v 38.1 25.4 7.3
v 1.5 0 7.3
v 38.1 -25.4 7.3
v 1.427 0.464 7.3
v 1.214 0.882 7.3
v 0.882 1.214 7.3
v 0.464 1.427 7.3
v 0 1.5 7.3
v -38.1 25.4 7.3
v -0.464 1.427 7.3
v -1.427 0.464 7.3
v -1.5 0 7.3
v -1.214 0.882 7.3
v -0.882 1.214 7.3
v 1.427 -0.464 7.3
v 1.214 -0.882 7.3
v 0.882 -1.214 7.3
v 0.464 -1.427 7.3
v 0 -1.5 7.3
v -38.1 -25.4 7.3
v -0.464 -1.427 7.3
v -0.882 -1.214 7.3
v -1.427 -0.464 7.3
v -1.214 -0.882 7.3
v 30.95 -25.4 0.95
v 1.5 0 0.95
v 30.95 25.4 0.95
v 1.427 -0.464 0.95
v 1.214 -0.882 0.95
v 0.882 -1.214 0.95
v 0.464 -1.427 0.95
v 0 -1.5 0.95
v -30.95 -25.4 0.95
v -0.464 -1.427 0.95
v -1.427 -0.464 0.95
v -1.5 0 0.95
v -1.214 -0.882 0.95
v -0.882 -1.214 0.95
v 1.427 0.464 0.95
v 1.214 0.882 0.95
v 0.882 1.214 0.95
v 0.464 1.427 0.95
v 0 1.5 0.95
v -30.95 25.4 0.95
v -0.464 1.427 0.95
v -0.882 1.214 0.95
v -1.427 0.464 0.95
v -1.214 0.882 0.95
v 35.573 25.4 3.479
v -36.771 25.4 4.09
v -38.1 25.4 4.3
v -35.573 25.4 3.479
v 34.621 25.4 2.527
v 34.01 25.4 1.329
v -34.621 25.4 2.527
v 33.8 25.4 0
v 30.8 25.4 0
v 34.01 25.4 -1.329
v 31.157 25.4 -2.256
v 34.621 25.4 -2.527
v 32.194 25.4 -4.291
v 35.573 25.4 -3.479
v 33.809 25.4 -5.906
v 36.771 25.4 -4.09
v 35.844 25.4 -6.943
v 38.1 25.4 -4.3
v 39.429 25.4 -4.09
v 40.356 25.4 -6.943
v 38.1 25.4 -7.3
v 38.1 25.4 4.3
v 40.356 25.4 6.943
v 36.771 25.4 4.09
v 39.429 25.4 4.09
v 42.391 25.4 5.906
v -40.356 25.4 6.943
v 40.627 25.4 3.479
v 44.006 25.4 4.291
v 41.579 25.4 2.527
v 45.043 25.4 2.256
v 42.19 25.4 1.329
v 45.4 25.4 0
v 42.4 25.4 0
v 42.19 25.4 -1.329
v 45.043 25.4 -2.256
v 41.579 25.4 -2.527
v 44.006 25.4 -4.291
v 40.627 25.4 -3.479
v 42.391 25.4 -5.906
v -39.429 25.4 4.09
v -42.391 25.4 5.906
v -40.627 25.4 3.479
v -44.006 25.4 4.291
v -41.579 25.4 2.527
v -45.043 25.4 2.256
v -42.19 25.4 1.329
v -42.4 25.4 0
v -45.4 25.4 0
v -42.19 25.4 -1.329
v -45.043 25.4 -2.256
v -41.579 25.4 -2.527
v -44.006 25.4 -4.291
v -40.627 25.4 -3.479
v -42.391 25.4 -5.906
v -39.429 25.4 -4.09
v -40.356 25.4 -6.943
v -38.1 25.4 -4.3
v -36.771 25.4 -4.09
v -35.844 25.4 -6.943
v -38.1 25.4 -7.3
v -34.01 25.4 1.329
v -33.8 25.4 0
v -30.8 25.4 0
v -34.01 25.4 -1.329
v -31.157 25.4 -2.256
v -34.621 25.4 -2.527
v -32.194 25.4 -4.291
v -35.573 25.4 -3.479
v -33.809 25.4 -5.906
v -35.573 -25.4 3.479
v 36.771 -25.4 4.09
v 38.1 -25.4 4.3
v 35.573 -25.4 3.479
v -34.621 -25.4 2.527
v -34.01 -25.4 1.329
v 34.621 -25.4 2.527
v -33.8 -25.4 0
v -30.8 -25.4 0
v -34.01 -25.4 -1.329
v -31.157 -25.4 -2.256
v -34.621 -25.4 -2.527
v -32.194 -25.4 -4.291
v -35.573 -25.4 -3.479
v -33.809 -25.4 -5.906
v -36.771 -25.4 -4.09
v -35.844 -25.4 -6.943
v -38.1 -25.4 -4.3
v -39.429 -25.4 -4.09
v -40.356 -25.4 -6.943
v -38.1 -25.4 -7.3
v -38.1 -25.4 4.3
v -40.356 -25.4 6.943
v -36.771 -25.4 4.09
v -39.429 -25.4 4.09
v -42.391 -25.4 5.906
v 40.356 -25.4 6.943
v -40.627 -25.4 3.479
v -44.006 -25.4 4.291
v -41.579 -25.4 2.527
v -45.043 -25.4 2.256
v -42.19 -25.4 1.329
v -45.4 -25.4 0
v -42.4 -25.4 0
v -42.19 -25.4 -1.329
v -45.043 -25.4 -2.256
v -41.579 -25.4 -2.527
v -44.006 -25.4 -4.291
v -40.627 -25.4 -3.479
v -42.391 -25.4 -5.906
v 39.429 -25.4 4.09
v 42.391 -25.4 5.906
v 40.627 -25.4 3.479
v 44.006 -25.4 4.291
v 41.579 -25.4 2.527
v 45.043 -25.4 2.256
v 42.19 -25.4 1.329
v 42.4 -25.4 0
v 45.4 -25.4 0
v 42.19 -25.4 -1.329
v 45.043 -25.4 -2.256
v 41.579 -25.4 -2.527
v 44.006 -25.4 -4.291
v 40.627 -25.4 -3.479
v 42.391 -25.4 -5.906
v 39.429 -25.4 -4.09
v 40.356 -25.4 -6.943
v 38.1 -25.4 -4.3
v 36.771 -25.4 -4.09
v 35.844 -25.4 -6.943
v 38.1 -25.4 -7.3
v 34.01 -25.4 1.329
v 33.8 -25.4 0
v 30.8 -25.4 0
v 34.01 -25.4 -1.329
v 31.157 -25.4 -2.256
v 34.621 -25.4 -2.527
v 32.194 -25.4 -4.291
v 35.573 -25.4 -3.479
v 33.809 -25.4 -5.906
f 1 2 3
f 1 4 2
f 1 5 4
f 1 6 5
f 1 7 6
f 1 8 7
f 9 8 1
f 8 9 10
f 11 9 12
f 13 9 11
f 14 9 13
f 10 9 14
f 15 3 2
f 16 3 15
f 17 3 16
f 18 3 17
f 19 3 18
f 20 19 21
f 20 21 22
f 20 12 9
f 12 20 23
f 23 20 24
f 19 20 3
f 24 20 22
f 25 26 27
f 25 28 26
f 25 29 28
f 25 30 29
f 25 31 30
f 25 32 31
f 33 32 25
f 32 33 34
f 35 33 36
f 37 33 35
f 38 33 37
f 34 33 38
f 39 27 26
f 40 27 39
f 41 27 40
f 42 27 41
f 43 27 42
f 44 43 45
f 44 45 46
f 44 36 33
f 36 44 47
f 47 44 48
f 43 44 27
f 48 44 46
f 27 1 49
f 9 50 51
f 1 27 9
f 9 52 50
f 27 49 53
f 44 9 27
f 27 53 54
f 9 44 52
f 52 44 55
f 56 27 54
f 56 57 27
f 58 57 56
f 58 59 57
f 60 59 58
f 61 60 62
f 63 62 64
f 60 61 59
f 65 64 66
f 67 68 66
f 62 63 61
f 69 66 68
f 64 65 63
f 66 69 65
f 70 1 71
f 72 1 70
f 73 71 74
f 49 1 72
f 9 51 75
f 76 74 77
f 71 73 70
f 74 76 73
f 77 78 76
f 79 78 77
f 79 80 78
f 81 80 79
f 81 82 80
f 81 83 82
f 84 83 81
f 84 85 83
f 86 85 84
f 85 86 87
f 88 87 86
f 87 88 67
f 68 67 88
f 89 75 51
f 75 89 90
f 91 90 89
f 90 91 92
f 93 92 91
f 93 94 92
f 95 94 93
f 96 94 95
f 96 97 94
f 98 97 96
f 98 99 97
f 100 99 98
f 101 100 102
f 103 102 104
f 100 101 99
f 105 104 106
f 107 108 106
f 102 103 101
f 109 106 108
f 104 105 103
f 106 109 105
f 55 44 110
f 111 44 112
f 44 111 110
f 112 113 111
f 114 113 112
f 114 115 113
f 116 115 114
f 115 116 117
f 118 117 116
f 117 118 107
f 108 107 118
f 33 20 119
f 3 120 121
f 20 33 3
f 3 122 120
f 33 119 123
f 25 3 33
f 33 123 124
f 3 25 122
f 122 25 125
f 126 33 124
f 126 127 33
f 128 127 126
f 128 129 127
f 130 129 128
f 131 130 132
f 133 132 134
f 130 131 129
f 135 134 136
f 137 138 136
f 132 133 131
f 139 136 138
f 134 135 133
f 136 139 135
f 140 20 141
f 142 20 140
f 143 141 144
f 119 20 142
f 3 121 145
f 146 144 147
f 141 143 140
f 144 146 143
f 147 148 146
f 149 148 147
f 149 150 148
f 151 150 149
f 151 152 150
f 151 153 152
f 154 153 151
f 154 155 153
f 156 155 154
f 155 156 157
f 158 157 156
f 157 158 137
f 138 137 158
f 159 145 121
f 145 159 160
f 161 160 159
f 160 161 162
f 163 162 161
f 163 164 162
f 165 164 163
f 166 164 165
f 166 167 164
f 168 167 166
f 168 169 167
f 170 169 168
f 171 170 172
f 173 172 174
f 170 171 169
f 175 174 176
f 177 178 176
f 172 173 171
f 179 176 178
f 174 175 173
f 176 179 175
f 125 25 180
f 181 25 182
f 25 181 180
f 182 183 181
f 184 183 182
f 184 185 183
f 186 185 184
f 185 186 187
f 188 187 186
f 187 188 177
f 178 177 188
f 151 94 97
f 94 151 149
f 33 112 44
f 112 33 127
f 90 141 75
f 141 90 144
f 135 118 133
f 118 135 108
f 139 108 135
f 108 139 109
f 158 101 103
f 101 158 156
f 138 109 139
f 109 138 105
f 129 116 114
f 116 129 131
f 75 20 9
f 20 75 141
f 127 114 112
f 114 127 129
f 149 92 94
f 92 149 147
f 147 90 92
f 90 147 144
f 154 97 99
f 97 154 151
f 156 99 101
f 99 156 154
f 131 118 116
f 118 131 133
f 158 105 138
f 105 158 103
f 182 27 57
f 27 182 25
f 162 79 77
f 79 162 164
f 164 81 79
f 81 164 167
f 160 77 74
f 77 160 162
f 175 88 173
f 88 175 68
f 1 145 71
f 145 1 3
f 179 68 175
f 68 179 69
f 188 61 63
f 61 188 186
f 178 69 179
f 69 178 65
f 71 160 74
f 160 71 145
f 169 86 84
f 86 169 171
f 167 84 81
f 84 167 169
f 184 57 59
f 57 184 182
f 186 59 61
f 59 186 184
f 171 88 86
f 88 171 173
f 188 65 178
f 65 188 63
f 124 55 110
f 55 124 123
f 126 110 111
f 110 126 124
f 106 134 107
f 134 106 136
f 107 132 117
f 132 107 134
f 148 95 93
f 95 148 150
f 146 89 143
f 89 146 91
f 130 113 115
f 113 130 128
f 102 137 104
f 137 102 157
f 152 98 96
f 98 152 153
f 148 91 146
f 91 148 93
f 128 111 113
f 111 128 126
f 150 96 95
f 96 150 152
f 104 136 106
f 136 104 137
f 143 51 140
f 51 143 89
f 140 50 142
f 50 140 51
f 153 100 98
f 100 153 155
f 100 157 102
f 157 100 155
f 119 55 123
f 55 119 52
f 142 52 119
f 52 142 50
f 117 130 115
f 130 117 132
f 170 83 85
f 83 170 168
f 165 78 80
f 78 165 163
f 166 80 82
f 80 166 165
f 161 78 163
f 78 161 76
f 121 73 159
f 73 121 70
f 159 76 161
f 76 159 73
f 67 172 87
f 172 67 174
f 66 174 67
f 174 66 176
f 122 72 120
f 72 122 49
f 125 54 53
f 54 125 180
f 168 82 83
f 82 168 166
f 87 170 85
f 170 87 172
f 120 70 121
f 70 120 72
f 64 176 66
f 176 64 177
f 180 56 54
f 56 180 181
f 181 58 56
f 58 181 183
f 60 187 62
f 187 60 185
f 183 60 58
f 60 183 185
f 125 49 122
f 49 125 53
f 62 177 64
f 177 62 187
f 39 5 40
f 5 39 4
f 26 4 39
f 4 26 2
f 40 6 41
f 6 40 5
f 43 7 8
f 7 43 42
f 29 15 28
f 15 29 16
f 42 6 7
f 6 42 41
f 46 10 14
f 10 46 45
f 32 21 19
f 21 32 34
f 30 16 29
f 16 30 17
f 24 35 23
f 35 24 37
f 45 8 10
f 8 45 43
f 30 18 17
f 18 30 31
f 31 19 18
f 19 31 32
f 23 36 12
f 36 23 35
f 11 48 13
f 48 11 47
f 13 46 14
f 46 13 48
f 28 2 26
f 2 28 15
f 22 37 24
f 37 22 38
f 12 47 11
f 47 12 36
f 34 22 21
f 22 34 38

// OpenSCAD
include <MCAD/units.scad>

// Platform parameters
platform_width = 2*inch;
platform_thickness = .25*inch;

// Threaded rod parameters
rod_diameter = M8 + 0.6;
rod_distance = 3*inch;
rod_margin = 3;

// Center screw hole
screw_size = M3;

generatePlatform();

module generatePlatform() {
	difference() {
		union() {
			// Bridge
			translate([0, 0, rod_diameter/2 - .175])
				cube([rod_distance, platform_width, platform_thickness], center = true);

			// Left rod carriage
			translate([-rod_distance/2, 0, 0])
				rotate([90,0,0])
					cylinder(h = platform_width, r = rod_diameter/2 + rod_margin, $fn = 20, center = true);
			
			// Right rod carriage
			translate([rod_distance/2, 0, 0])
				rotate([90,0,0])
					cylinder(h = platform_width, r = rod_diameter/2 + rod_margin, $fn = 20, center = true);	

		}
	
		// Left rod hole
		translate([-rod_distance/2, 0, 0])
			rotate([90,0,0])
				cylinder(h = platform_width + 5, r = rod_diameter/2, $fn = 20, center = true);
	
		// Right rod hole
		translate([rod_distance/2, 0, 0])
			rotate([90,0,0])
				cylinder(h = platform_width + 5, r = rod_diameter/2, $fn = 20, center = true);
	
		// Center screw hole
		translate([0,0, rod_diameter/2])
		cylinder(h = platform_thickness + 5, r = screw_size/2, $fn = 20, center = true);
	}
}
